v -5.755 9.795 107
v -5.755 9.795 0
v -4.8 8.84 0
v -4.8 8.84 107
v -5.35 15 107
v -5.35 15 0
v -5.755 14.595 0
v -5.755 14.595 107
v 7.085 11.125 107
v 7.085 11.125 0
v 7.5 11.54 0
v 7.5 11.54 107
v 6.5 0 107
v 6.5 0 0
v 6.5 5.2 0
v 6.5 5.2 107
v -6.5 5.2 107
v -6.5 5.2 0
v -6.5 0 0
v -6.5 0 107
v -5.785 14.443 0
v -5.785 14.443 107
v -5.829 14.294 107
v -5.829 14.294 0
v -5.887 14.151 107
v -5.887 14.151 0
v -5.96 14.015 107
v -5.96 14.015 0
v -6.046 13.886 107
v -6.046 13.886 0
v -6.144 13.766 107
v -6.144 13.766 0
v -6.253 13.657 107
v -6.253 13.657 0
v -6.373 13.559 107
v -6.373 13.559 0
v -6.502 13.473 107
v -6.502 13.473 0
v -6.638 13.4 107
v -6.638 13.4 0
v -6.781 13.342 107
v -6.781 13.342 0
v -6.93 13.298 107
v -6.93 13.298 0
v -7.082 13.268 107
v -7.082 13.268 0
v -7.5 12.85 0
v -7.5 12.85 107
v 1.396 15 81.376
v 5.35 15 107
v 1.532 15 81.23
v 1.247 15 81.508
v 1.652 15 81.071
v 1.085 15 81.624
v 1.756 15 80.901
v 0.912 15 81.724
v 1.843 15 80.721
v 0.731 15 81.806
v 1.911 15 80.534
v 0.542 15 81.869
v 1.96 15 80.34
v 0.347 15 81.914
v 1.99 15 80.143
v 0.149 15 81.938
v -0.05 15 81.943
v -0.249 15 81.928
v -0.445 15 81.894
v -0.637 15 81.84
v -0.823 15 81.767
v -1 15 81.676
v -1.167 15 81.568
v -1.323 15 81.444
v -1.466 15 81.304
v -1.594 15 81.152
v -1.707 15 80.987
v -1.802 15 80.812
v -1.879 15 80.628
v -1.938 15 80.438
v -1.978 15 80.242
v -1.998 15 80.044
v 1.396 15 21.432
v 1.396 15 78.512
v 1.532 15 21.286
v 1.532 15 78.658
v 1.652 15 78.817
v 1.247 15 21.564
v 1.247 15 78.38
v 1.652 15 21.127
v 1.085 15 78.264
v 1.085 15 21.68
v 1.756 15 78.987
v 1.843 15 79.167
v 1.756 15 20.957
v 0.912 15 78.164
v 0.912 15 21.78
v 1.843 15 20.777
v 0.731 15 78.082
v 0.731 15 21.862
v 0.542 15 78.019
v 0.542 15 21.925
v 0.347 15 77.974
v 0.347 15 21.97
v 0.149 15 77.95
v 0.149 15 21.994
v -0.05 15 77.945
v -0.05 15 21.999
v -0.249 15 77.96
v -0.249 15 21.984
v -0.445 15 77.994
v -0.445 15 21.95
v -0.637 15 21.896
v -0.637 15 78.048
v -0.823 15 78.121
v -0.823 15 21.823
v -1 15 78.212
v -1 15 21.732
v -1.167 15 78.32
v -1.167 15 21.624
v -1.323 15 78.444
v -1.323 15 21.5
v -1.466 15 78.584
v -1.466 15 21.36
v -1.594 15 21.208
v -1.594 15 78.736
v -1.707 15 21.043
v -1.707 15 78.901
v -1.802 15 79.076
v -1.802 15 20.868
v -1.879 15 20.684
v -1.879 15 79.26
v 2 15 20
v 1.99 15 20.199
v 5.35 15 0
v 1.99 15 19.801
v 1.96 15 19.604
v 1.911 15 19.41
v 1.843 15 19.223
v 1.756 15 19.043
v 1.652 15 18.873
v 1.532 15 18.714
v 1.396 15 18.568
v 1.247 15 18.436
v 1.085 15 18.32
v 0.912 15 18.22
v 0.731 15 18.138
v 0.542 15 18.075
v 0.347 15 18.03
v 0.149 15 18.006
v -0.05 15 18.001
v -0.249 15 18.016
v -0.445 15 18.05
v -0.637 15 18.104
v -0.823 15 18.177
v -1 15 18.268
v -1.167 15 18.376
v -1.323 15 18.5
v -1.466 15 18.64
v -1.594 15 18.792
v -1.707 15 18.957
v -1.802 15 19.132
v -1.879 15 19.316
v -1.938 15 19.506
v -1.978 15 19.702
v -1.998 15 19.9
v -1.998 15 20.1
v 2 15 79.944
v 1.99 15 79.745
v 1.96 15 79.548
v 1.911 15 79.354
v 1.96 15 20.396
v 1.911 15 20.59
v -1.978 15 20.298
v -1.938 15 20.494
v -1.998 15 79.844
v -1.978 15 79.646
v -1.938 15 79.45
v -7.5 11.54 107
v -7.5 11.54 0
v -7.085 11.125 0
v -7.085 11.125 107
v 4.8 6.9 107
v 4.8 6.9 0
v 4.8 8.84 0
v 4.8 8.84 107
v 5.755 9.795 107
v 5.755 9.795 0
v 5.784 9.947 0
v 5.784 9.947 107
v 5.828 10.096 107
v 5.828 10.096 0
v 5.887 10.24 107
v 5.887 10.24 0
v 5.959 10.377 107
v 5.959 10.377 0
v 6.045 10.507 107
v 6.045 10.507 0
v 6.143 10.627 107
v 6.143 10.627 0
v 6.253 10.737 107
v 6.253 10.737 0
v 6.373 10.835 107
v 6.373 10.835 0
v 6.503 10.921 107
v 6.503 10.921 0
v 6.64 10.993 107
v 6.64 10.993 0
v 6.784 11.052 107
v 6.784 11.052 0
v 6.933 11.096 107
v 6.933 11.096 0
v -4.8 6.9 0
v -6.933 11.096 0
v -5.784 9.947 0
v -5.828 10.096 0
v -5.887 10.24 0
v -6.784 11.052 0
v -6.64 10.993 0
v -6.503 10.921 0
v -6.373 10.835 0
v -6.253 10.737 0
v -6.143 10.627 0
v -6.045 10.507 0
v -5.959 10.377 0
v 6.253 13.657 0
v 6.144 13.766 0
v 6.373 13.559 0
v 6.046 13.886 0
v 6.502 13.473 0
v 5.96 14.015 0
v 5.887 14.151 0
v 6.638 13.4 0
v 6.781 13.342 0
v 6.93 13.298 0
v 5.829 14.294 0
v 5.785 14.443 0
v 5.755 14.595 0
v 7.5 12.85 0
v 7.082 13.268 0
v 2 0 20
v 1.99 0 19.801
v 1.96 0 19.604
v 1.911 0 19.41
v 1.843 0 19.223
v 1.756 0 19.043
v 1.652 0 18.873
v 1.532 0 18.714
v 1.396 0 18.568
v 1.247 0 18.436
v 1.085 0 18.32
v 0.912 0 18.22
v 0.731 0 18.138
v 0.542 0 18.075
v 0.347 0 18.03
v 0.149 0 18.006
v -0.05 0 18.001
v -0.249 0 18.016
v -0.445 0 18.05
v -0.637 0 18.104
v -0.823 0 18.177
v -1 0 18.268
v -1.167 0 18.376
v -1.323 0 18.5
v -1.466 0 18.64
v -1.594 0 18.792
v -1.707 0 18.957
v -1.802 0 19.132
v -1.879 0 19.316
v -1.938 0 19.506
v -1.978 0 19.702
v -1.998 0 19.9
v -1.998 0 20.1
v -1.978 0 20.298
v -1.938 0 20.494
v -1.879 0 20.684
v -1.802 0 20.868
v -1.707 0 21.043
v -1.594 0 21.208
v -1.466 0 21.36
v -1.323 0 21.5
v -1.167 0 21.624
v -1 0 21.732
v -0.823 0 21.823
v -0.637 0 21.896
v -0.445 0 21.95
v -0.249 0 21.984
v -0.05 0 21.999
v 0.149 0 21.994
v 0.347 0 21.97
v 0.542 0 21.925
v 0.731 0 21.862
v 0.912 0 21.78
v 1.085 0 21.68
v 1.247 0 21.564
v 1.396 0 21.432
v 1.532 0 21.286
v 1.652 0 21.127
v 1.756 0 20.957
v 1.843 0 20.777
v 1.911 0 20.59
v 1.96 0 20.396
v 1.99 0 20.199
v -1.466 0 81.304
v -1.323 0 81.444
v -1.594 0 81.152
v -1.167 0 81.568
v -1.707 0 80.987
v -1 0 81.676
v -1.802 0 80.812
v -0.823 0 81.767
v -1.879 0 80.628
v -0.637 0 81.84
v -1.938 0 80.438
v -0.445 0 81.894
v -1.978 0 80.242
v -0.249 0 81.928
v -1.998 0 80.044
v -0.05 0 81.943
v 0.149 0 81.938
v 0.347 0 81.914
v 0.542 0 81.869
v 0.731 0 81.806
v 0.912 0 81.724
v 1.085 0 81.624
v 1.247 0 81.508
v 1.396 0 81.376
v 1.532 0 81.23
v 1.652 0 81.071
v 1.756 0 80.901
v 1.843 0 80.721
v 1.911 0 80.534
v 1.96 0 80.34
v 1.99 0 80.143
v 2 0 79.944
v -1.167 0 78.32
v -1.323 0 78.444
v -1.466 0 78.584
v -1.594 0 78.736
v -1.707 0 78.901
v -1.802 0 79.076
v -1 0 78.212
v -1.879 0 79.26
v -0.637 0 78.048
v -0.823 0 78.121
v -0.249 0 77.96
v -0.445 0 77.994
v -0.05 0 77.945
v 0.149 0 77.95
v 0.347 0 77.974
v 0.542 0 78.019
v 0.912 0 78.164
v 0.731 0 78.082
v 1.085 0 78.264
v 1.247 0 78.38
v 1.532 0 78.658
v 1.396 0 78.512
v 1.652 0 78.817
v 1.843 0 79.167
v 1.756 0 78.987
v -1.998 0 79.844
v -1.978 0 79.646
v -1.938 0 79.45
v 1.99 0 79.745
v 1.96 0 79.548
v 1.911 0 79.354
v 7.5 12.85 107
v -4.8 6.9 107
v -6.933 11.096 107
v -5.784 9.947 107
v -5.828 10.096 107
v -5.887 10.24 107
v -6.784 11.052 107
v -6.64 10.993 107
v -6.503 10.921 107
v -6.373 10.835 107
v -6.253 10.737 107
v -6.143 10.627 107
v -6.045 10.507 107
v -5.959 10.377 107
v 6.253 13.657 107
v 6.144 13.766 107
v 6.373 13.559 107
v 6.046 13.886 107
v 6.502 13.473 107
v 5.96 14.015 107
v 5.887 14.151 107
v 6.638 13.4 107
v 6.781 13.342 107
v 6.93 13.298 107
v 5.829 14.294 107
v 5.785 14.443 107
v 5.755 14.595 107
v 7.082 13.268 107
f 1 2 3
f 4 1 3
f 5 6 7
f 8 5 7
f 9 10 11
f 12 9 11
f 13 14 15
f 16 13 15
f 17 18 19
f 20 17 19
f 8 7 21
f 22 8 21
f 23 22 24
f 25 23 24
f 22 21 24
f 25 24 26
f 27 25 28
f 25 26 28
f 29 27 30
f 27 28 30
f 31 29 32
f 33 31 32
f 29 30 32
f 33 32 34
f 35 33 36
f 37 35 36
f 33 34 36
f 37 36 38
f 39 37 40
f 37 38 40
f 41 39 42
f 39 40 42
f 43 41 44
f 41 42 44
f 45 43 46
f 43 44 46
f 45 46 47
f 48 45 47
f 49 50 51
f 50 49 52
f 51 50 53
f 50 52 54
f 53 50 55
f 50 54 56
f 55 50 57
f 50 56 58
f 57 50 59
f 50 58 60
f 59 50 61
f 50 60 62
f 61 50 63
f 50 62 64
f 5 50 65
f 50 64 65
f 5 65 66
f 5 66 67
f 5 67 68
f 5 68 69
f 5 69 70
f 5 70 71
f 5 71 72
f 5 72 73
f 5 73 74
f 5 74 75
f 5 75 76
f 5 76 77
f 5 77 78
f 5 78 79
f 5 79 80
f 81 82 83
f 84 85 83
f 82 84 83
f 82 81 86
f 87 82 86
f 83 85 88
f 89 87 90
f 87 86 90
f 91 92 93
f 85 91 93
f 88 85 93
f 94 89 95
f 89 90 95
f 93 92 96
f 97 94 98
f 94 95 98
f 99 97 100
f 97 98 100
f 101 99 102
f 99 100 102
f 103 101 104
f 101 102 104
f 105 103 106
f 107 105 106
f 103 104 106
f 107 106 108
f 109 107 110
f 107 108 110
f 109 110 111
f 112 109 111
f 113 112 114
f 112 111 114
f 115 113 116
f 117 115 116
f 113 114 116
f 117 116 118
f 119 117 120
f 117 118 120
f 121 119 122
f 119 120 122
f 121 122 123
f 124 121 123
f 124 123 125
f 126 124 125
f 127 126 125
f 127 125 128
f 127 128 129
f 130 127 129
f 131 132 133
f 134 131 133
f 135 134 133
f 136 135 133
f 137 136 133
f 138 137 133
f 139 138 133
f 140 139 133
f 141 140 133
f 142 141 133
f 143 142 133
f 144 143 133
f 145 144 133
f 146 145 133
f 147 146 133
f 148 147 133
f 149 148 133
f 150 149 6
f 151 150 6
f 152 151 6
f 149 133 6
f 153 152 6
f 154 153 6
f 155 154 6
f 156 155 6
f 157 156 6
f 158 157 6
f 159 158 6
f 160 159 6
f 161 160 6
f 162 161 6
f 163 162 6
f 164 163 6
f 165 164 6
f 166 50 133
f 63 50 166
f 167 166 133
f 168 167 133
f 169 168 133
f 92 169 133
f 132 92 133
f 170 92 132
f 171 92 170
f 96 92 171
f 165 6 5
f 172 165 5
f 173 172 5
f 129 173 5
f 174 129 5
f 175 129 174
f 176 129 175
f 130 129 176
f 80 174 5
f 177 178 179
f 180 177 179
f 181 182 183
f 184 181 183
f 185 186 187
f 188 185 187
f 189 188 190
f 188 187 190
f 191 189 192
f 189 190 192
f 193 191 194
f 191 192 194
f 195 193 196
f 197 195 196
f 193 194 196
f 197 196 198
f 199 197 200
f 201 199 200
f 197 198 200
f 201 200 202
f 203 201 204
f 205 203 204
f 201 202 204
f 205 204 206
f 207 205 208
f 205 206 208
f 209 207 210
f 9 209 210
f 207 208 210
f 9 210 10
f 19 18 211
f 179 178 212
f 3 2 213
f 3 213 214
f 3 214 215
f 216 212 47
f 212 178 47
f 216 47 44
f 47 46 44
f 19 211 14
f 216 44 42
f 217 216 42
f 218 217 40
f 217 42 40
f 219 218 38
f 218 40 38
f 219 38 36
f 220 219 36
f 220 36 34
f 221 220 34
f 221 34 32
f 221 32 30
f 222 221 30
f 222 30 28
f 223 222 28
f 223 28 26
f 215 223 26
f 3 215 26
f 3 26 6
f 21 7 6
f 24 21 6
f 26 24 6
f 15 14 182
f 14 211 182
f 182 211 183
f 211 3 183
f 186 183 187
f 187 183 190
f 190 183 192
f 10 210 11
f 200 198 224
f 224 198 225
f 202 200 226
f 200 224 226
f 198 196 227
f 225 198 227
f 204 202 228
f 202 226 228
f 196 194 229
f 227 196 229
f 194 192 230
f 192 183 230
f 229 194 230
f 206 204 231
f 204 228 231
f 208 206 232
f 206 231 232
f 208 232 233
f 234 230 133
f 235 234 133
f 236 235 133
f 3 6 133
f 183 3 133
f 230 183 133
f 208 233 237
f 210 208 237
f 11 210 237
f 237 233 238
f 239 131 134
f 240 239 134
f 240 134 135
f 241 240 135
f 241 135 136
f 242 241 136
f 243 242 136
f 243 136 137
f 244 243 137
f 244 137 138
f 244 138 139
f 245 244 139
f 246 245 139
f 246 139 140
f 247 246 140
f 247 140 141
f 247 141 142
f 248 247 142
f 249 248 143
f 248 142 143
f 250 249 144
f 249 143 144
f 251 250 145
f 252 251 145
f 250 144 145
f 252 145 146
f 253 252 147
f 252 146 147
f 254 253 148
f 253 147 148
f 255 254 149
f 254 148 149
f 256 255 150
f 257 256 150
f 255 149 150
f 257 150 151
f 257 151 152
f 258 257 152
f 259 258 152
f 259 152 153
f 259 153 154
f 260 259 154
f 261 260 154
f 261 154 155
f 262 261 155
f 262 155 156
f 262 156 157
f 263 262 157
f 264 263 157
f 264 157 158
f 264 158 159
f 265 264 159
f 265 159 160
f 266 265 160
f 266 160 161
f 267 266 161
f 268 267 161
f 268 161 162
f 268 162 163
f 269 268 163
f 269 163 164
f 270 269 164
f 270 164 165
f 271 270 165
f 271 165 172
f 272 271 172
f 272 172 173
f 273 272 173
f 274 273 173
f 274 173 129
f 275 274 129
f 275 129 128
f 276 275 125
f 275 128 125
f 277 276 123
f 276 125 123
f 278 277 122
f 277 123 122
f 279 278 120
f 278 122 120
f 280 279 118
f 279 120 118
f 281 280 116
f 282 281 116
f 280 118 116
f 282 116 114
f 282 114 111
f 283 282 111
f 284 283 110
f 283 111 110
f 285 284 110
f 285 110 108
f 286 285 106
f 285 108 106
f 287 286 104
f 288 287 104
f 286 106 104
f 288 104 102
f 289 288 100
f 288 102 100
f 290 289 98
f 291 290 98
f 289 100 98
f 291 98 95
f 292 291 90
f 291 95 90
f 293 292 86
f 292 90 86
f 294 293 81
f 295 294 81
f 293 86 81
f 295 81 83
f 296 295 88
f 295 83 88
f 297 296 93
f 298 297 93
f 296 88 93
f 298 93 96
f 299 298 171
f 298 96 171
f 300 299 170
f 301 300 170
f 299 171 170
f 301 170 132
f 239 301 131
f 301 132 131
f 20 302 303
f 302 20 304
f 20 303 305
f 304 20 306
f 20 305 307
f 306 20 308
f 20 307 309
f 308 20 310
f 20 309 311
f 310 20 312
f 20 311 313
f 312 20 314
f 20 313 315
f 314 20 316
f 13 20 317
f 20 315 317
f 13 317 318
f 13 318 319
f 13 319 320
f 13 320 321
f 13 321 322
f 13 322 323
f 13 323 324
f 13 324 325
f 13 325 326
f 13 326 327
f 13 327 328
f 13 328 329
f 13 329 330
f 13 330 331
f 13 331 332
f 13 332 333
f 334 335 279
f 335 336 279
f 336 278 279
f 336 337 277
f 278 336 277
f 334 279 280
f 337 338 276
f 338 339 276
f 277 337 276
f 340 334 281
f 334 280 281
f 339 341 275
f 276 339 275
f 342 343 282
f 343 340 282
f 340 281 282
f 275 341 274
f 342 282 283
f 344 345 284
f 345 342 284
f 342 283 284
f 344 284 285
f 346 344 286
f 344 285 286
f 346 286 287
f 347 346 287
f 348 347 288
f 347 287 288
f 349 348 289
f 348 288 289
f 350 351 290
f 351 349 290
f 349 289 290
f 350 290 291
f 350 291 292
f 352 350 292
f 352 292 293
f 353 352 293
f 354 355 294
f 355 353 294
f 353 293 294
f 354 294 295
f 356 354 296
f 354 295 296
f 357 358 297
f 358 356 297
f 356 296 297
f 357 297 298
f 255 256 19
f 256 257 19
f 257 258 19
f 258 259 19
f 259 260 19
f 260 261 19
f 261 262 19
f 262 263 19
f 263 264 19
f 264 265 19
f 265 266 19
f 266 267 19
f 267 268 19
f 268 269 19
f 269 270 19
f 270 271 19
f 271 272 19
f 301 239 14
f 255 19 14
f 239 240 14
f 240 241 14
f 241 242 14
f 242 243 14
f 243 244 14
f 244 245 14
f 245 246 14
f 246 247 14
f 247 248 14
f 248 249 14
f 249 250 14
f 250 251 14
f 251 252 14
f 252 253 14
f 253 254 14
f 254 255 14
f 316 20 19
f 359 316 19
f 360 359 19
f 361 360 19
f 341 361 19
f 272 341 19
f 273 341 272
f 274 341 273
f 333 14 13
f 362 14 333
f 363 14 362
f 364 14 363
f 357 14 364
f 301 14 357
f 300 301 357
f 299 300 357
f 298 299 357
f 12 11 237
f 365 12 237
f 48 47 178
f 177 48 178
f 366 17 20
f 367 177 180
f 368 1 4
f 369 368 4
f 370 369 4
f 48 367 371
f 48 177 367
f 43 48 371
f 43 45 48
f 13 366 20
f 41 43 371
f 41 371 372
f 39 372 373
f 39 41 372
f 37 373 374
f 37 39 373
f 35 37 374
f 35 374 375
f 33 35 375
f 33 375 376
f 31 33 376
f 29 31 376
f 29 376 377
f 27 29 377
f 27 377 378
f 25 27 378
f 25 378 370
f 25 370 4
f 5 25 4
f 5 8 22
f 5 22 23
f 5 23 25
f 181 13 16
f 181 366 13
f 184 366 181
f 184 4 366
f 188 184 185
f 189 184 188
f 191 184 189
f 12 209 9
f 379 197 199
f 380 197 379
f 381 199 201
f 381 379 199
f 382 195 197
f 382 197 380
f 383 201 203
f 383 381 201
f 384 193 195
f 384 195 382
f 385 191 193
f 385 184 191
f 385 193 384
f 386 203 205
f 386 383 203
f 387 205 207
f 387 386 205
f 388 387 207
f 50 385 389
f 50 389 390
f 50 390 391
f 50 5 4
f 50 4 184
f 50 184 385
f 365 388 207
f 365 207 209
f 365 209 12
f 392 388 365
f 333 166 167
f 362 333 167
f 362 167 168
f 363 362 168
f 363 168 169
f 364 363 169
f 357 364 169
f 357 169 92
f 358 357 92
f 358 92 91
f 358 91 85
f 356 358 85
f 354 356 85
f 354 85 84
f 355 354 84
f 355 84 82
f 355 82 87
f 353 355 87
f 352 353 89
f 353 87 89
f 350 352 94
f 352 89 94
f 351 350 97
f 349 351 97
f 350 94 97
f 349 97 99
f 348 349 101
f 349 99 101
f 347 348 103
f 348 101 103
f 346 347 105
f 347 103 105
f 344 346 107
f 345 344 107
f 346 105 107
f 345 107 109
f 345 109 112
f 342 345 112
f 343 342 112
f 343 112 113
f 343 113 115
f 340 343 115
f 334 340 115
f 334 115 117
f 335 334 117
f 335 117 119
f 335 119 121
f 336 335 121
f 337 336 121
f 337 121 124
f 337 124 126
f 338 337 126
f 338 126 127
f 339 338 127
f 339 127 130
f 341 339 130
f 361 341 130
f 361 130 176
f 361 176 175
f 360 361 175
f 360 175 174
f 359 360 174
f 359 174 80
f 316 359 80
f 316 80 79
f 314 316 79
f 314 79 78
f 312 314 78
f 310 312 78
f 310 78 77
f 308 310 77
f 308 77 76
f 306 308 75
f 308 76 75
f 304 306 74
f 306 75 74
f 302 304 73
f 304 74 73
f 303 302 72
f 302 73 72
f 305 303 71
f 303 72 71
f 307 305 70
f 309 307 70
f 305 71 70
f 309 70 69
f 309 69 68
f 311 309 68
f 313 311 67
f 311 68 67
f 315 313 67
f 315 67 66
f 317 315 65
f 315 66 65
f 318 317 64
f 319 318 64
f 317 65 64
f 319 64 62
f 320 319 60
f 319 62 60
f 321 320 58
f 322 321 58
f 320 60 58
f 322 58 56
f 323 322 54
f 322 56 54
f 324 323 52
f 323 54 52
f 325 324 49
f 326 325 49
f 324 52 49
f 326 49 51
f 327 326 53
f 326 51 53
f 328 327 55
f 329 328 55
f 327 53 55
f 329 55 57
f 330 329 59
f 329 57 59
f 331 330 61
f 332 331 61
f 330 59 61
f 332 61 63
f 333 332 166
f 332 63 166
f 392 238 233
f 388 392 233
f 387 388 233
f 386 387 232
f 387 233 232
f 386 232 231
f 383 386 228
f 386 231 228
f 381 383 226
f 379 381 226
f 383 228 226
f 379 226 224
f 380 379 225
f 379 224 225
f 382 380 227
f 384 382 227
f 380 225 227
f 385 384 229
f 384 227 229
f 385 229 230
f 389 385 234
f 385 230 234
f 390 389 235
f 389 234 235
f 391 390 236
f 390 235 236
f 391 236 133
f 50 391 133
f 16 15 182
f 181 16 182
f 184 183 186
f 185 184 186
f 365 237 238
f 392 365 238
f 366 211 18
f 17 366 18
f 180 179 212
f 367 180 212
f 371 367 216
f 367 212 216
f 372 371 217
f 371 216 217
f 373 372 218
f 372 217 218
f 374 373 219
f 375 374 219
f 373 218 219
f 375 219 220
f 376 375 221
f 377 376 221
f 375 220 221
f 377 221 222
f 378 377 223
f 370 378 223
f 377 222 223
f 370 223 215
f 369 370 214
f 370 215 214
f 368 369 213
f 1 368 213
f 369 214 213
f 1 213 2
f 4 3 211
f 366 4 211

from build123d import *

# Parameters (mm, degrees)
BOSS_EXTRUDE1_DEPTH = 107.00004
SKETCH2_R           = 2
CUT_EXTRUDE1_DEPTH  = 16


with BuildPart() as part:
    # Sketch1 → Boss-Extrude1 (new body)
    with BuildSketch(Plane.XY):
        with BuildLine():
            Line((-6.5, 0), (6.5, 0))
            Line((6.5, 0), (6.5, 5.2))
            Line((6.5, 5.2), (4.8, 6.9))
            Line((4.8, 6.9), (4.8, 8.84))
            Line((4.8, 8.84), (5.754868434, 9.794868434))
            ThreePointArc((5.754868434, 9.794868434), (6.196913421, 10.683086579), (7.085131566, 11.125131566))
            Line((7.085131566, 11.125131566), (7.5, 11.54))
            Line((7.5, 11.54), (7.5, 12.85))
            Line((7.5, 12.85), (7.08164233, 13.26835767))
            ThreePointArc((7.08164233, 13.26835767), (6.196913421, 13.709913421), (5.75535767, 14.59464233))
            Line((5.75535767, 14.59464233), (5.35, 15))
            Line((5.35, 15), (-5.35, 15))
            Line((-5.35, 15), (-5.75535767, 14.59464233))
            ThreePointArc((-5.75535767, 14.59464233), (-6.196913421, 13.709913421), (-7.08164233, 13.26835767))
            Line((-7.08164233, 13.26835767), (-7.5, 12.85))
            Line((-7.5, 12.85), (-7.5, 11.54))
            Line((-7.5, 11.54), (-7.085131566, 11.125131566))
            ThreePointArc((-7.085131566, 11.125131566), (-6.196913421, 10.683086579), (-5.754868434, 9.794868434))
            Line((-5.754868434, 9.794868434), (-4.8, 8.84))
            Line((-4.8, 8.84), (-4.8, 6.9))
            Line((-4.8, 6.9), (-6.5, 5.2))
            Line((-6.5, 5.2), (-6.5, 0))
        make_face()
    extrude(amount=BOSS_EXTRUDE1_DEPTH)

    # Sketch2 → Cut-Extrude1 (cut, through all)
    with BuildSketch(Plane(origin=(0, 15, 0), x_dir=(1, 0, 0), z_dir=(0, 1, 0))):
        with Locations((0, -20)):
            Circle(SKETCH2_R)
        with Locations((0, -79.944)):
            Circle(SKETCH2_R)
    extrude(amount=-CUT_EXTRUDE1_DEPTH, mode=Mode.SUBTRACT)


solid = part.part
